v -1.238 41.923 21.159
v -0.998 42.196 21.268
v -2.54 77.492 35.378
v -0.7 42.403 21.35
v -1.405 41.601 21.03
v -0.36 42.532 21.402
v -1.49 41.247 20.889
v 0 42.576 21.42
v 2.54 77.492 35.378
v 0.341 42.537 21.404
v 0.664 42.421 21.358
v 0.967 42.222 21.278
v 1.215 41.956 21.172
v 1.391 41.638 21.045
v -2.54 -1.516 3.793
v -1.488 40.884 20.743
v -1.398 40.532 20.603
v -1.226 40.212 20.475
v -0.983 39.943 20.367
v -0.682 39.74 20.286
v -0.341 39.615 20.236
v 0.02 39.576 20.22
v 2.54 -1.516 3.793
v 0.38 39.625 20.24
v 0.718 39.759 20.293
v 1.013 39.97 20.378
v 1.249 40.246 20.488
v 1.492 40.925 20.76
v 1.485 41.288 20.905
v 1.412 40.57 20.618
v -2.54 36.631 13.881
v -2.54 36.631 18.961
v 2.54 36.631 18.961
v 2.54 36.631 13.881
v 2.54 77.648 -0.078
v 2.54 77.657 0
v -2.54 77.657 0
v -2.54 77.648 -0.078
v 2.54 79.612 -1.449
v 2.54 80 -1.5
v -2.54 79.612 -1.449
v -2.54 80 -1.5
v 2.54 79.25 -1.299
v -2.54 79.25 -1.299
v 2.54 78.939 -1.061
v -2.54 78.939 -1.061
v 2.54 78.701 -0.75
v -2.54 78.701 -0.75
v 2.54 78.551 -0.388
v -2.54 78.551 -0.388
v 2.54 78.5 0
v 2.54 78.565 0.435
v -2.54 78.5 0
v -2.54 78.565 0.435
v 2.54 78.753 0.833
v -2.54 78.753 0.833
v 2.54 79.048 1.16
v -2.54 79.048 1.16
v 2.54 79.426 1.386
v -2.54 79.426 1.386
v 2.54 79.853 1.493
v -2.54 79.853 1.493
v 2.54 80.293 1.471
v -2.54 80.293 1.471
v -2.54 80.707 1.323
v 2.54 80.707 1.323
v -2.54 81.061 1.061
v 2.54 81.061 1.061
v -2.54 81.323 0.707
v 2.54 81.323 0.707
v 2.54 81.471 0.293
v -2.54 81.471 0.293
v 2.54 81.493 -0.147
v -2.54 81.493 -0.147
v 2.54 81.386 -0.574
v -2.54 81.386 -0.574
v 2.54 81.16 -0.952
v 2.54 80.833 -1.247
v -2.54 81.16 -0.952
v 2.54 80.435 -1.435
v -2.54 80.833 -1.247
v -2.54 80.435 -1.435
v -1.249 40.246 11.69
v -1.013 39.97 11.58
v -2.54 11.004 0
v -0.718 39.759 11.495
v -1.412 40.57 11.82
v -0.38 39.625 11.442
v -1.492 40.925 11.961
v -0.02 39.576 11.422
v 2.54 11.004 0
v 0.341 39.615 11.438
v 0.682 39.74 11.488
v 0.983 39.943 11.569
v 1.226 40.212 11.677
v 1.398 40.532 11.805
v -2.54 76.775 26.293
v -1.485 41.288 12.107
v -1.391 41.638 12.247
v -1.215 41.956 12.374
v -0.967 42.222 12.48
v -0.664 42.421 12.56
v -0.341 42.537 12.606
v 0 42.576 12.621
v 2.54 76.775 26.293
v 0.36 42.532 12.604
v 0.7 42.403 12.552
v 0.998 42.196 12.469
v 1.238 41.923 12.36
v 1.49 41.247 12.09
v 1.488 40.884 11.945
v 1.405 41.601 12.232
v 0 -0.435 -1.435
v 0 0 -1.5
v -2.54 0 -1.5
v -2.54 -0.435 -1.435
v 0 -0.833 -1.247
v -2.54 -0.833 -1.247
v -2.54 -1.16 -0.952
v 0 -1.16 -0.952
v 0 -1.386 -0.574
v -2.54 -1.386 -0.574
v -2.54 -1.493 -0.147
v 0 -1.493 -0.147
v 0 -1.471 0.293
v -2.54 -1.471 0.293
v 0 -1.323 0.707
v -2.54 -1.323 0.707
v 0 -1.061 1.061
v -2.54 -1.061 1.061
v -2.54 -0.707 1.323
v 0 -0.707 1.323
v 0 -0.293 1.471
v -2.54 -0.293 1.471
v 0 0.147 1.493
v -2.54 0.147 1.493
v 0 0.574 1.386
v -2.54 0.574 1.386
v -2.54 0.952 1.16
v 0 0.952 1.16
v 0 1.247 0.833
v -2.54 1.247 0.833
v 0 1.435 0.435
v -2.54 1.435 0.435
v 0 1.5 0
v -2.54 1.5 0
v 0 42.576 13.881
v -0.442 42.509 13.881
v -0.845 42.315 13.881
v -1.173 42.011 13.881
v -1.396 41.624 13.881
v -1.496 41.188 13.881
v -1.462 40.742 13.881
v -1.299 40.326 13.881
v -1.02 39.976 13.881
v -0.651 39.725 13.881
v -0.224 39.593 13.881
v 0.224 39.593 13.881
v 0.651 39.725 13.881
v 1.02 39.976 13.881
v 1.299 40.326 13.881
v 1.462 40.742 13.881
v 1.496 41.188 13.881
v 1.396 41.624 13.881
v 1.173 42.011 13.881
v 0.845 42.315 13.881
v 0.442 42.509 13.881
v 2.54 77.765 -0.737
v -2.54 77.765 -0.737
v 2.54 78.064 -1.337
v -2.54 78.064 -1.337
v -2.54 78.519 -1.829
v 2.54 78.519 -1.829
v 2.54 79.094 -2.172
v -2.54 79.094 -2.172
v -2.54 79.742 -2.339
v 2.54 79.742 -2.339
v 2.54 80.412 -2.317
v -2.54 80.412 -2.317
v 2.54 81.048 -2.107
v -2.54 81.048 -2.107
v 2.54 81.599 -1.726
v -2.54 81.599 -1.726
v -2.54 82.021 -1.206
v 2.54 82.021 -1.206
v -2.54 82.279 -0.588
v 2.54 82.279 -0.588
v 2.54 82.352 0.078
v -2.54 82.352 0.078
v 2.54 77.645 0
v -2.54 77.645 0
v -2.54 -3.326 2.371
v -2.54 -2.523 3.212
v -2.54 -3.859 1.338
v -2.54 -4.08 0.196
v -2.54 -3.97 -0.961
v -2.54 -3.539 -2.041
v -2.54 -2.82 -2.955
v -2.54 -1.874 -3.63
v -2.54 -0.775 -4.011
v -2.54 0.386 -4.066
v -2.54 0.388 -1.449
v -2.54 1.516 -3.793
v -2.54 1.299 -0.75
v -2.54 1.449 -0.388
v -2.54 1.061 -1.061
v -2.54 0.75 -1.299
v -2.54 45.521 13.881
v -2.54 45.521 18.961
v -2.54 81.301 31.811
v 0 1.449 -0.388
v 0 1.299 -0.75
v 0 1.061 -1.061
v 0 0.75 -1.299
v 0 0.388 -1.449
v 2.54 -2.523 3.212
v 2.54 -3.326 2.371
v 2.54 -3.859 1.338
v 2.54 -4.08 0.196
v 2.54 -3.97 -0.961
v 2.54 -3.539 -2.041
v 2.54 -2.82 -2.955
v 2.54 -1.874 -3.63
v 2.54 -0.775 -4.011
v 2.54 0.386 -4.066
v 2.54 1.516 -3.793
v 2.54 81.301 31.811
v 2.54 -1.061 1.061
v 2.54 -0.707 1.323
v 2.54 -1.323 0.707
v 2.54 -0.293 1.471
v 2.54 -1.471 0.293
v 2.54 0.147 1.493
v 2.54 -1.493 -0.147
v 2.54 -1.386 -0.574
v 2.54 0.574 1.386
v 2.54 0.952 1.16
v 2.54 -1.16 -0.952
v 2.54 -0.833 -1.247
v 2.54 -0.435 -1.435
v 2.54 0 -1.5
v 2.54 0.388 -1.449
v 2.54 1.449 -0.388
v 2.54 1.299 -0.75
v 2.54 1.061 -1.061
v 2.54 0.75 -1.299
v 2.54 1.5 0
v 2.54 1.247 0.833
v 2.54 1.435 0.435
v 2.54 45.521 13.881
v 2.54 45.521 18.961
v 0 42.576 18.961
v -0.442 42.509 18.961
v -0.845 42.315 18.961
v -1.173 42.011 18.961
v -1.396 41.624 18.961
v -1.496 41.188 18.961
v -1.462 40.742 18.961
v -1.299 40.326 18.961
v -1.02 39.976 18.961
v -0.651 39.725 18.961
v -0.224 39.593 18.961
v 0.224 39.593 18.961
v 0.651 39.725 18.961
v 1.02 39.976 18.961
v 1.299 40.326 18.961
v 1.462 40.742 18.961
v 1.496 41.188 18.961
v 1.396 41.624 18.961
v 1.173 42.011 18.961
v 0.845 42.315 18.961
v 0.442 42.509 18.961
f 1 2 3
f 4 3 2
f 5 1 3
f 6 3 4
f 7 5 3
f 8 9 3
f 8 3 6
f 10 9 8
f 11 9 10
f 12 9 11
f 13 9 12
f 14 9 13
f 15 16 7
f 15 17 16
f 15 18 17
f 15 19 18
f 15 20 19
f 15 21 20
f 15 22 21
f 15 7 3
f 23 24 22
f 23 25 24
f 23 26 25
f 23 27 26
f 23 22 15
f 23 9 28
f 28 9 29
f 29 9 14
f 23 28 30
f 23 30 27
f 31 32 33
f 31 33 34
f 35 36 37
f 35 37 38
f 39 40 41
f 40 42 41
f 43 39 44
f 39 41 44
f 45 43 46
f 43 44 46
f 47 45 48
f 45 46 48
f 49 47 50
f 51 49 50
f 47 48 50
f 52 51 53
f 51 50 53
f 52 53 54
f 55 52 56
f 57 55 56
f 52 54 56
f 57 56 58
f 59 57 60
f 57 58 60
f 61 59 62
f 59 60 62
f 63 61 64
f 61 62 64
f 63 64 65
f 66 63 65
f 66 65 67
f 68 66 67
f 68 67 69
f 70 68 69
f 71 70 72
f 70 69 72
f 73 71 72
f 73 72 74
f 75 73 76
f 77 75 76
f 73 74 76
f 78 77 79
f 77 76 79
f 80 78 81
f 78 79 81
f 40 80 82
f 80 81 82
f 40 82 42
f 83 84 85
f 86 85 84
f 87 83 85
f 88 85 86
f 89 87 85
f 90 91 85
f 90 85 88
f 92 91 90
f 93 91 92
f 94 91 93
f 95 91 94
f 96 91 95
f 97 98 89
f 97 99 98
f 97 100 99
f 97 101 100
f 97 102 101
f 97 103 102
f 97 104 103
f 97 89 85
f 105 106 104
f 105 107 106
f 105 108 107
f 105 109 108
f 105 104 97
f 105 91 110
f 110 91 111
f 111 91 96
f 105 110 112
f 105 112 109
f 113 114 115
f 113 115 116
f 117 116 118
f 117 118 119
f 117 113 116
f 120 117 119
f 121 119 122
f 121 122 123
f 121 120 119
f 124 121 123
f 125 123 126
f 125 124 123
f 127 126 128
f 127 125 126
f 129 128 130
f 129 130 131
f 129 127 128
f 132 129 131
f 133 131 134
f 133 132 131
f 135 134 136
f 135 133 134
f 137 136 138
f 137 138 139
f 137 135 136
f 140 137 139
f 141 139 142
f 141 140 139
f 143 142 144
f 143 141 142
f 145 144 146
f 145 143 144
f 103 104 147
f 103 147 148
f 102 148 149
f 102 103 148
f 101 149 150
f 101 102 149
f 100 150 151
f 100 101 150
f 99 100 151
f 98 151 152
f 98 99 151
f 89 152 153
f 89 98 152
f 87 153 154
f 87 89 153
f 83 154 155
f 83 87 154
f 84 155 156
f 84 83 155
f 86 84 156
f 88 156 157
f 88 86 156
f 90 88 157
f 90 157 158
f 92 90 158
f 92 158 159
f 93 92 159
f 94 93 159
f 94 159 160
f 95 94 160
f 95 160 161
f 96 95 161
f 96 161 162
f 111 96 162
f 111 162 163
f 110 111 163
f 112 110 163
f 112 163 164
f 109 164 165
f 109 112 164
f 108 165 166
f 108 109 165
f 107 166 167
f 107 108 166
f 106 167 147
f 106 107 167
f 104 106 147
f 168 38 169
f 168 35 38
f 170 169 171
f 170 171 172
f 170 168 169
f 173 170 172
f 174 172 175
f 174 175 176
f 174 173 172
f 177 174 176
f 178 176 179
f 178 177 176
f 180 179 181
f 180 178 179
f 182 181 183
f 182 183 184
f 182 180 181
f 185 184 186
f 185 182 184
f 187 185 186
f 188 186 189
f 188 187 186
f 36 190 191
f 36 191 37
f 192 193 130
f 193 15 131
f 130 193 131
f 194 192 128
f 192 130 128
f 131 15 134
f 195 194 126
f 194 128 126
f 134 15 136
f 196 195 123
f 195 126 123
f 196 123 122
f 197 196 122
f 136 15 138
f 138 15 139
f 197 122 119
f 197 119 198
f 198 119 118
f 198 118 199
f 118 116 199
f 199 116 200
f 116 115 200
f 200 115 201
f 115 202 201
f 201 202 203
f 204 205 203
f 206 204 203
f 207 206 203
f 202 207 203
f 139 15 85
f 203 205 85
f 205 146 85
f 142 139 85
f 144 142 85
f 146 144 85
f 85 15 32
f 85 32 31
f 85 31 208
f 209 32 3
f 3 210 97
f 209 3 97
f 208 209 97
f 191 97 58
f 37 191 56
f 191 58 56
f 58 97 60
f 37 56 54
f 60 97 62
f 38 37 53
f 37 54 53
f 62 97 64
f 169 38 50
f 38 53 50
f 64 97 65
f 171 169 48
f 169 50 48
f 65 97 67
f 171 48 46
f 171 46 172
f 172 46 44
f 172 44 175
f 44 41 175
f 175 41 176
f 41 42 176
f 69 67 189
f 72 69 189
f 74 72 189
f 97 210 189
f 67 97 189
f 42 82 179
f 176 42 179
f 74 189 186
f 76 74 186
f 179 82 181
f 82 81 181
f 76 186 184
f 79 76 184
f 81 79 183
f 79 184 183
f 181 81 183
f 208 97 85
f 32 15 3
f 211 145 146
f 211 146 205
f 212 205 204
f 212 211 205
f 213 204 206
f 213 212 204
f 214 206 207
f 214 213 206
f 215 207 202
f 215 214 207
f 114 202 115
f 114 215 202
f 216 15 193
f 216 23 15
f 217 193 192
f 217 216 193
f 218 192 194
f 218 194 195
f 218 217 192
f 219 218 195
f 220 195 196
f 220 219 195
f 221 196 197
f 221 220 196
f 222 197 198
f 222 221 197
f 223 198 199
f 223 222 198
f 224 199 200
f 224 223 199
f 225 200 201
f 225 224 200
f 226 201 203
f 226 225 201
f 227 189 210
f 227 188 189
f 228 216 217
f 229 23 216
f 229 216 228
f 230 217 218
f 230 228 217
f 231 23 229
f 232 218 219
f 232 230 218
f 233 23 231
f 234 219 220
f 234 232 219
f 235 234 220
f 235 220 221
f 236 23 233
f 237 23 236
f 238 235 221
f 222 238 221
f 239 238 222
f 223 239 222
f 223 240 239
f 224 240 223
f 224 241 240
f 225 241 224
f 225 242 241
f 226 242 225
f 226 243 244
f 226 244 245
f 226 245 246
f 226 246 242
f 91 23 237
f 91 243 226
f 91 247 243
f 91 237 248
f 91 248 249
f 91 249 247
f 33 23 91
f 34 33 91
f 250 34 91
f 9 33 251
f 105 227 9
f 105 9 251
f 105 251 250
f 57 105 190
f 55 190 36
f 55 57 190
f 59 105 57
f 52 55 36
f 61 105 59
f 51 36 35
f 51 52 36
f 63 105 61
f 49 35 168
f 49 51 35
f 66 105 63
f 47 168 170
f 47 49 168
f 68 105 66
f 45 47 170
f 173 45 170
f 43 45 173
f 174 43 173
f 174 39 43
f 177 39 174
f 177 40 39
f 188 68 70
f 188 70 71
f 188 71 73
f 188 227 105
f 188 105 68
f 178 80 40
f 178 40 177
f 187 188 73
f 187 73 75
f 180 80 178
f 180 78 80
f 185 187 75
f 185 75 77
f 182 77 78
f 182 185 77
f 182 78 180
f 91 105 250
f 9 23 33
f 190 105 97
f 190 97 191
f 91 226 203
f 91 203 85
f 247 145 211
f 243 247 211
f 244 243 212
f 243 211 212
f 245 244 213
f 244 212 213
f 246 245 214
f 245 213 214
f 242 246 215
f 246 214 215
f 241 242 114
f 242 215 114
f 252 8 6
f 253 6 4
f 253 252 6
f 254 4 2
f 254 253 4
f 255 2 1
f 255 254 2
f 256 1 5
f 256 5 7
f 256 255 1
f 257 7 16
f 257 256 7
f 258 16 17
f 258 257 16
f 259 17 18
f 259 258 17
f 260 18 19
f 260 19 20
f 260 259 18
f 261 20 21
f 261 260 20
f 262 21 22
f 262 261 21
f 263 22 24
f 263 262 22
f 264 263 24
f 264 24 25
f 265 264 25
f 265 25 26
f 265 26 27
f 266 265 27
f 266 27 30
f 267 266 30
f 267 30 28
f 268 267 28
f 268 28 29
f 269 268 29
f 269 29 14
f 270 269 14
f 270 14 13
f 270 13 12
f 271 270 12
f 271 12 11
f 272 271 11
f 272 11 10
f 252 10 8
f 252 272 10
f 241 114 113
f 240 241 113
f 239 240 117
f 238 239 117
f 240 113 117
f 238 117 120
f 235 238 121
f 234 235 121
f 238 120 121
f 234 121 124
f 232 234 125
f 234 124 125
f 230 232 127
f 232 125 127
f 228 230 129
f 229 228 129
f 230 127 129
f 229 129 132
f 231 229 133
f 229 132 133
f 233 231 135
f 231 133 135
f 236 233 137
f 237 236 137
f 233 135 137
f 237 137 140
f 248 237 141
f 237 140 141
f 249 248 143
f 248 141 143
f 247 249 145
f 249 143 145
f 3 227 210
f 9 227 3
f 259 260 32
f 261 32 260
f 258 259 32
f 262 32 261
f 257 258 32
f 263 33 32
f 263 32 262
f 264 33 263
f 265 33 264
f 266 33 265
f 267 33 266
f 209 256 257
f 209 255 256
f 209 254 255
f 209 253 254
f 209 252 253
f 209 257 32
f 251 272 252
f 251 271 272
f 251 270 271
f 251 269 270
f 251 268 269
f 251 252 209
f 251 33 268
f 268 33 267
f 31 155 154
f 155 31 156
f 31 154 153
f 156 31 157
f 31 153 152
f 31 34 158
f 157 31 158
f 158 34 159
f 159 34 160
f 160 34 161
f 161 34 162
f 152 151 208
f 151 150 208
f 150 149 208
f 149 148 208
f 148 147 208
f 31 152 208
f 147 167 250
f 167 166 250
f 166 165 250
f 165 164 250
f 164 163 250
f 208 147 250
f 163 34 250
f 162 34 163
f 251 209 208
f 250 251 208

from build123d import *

# Parameters (mm, degrees)
BOSS_EXTRUDE1_DEPTH     = 2.54
SKETCH2_W               = 5.08
SKETCH2_H               = 8.89
CUT_EXTRUDE1_DEPTH      = 5.08
CUT_EXTRUDE2_DEPTH      = 86.150645665
CUT_EXTRUDE2_DEPTH_BACK = 86.150645665
SKETCH3_R               = 1.5


with BuildPart() as part:
    # Sketch1 → Boss-Extrude1 (new, symmetric)
    with BuildSketch(Plane(origin=(0, 0, 0), x_dir=(0, 0, -1), z_dir=(1, 0, 0))):
        with BuildLine():
            ThreePointArc((-3.792924612, -1.516297351), (1.516297351, -3.792924612), (3.792924612, 1.516297351))
            Line((3.792924612, 1.516297351), (0, 11.004065103))
            Line((0, 11.004065103), (-26.293066659, 76.774555024))
            Line((-26.293066659, 76.774555024), (0, 77.645444775))
            Line((0, 77.645444775), (0, 77.657240774))
            Line((0, 77.657240774), (0.077903078, 77.648025113))
            ThreePointArc((0.077903078, 77.648025113), (2.351974887, 80.077903078), (-0.077903078, 82.351974887))
            Line((-0.077903078, 82.351974887), (-31.810501027, 81.300914746))
            Line((-31.810501027, 81.300914746), (-35.377927791, 77.491646464))
            Line((-35.377927791, 77.491646464), (-3.792924612, -1.516297351))
        make_face()
        with BuildLine():
            ThreePointArc((1.5, 0), (-1.060660172, -1.060660172), (0, 1.5))
            ThreePointArc((0, 1.5), (1.060660172, 1.060660172), (1.5, 0))
        make_face(mode=Mode.SUBTRACT)
        with BuildLine():
            ThreePointArc((1.5, 80), (1.060660172, 78.939339828), (0, 78.5))
            ThreePointArc((0, 78.5), (-1.060660172, 81.060660172), (1.5, 80))
        make_face(mode=Mode.SUBTRACT)
    extrude(amount=BOSS_EXTRUDE1_DEPTH, both=True)

    # Sketch2 → Cut-Extrude1 (cut)
    with BuildSketch(Plane(origin=(2.54, 0, 0), x_dir=(0, 0, -1), z_dir=(1, 0, 0))):
        with Locations((-16.420936138, 41.075962298)):
            Rectangle(SKETCH2_W, SKETCH2_H)
    extrude(amount=-CUT_EXTRUDE1_DEPTH, mode=Mode.SUBTRACT)

    # Sketch3 → Cut-Extrude2 (cut, two sides: drawn at the far end of the back side and taken through both)
    with BuildSketch(Plane.XY.offset(13.880936138).offset(-CUT_EXTRUDE2_DEPTH_BACK)):
        with Locations(Location((0, 41.075962298, 0), (0, 0, 90))):
            Circle(SKETCH3_R)
    extrude(amount=CUT_EXTRUDE2_DEPTH + CUT_EXTRUDE2_DEPTH_BACK, mode=Mode.SUBTRACT)


solid = part.part
